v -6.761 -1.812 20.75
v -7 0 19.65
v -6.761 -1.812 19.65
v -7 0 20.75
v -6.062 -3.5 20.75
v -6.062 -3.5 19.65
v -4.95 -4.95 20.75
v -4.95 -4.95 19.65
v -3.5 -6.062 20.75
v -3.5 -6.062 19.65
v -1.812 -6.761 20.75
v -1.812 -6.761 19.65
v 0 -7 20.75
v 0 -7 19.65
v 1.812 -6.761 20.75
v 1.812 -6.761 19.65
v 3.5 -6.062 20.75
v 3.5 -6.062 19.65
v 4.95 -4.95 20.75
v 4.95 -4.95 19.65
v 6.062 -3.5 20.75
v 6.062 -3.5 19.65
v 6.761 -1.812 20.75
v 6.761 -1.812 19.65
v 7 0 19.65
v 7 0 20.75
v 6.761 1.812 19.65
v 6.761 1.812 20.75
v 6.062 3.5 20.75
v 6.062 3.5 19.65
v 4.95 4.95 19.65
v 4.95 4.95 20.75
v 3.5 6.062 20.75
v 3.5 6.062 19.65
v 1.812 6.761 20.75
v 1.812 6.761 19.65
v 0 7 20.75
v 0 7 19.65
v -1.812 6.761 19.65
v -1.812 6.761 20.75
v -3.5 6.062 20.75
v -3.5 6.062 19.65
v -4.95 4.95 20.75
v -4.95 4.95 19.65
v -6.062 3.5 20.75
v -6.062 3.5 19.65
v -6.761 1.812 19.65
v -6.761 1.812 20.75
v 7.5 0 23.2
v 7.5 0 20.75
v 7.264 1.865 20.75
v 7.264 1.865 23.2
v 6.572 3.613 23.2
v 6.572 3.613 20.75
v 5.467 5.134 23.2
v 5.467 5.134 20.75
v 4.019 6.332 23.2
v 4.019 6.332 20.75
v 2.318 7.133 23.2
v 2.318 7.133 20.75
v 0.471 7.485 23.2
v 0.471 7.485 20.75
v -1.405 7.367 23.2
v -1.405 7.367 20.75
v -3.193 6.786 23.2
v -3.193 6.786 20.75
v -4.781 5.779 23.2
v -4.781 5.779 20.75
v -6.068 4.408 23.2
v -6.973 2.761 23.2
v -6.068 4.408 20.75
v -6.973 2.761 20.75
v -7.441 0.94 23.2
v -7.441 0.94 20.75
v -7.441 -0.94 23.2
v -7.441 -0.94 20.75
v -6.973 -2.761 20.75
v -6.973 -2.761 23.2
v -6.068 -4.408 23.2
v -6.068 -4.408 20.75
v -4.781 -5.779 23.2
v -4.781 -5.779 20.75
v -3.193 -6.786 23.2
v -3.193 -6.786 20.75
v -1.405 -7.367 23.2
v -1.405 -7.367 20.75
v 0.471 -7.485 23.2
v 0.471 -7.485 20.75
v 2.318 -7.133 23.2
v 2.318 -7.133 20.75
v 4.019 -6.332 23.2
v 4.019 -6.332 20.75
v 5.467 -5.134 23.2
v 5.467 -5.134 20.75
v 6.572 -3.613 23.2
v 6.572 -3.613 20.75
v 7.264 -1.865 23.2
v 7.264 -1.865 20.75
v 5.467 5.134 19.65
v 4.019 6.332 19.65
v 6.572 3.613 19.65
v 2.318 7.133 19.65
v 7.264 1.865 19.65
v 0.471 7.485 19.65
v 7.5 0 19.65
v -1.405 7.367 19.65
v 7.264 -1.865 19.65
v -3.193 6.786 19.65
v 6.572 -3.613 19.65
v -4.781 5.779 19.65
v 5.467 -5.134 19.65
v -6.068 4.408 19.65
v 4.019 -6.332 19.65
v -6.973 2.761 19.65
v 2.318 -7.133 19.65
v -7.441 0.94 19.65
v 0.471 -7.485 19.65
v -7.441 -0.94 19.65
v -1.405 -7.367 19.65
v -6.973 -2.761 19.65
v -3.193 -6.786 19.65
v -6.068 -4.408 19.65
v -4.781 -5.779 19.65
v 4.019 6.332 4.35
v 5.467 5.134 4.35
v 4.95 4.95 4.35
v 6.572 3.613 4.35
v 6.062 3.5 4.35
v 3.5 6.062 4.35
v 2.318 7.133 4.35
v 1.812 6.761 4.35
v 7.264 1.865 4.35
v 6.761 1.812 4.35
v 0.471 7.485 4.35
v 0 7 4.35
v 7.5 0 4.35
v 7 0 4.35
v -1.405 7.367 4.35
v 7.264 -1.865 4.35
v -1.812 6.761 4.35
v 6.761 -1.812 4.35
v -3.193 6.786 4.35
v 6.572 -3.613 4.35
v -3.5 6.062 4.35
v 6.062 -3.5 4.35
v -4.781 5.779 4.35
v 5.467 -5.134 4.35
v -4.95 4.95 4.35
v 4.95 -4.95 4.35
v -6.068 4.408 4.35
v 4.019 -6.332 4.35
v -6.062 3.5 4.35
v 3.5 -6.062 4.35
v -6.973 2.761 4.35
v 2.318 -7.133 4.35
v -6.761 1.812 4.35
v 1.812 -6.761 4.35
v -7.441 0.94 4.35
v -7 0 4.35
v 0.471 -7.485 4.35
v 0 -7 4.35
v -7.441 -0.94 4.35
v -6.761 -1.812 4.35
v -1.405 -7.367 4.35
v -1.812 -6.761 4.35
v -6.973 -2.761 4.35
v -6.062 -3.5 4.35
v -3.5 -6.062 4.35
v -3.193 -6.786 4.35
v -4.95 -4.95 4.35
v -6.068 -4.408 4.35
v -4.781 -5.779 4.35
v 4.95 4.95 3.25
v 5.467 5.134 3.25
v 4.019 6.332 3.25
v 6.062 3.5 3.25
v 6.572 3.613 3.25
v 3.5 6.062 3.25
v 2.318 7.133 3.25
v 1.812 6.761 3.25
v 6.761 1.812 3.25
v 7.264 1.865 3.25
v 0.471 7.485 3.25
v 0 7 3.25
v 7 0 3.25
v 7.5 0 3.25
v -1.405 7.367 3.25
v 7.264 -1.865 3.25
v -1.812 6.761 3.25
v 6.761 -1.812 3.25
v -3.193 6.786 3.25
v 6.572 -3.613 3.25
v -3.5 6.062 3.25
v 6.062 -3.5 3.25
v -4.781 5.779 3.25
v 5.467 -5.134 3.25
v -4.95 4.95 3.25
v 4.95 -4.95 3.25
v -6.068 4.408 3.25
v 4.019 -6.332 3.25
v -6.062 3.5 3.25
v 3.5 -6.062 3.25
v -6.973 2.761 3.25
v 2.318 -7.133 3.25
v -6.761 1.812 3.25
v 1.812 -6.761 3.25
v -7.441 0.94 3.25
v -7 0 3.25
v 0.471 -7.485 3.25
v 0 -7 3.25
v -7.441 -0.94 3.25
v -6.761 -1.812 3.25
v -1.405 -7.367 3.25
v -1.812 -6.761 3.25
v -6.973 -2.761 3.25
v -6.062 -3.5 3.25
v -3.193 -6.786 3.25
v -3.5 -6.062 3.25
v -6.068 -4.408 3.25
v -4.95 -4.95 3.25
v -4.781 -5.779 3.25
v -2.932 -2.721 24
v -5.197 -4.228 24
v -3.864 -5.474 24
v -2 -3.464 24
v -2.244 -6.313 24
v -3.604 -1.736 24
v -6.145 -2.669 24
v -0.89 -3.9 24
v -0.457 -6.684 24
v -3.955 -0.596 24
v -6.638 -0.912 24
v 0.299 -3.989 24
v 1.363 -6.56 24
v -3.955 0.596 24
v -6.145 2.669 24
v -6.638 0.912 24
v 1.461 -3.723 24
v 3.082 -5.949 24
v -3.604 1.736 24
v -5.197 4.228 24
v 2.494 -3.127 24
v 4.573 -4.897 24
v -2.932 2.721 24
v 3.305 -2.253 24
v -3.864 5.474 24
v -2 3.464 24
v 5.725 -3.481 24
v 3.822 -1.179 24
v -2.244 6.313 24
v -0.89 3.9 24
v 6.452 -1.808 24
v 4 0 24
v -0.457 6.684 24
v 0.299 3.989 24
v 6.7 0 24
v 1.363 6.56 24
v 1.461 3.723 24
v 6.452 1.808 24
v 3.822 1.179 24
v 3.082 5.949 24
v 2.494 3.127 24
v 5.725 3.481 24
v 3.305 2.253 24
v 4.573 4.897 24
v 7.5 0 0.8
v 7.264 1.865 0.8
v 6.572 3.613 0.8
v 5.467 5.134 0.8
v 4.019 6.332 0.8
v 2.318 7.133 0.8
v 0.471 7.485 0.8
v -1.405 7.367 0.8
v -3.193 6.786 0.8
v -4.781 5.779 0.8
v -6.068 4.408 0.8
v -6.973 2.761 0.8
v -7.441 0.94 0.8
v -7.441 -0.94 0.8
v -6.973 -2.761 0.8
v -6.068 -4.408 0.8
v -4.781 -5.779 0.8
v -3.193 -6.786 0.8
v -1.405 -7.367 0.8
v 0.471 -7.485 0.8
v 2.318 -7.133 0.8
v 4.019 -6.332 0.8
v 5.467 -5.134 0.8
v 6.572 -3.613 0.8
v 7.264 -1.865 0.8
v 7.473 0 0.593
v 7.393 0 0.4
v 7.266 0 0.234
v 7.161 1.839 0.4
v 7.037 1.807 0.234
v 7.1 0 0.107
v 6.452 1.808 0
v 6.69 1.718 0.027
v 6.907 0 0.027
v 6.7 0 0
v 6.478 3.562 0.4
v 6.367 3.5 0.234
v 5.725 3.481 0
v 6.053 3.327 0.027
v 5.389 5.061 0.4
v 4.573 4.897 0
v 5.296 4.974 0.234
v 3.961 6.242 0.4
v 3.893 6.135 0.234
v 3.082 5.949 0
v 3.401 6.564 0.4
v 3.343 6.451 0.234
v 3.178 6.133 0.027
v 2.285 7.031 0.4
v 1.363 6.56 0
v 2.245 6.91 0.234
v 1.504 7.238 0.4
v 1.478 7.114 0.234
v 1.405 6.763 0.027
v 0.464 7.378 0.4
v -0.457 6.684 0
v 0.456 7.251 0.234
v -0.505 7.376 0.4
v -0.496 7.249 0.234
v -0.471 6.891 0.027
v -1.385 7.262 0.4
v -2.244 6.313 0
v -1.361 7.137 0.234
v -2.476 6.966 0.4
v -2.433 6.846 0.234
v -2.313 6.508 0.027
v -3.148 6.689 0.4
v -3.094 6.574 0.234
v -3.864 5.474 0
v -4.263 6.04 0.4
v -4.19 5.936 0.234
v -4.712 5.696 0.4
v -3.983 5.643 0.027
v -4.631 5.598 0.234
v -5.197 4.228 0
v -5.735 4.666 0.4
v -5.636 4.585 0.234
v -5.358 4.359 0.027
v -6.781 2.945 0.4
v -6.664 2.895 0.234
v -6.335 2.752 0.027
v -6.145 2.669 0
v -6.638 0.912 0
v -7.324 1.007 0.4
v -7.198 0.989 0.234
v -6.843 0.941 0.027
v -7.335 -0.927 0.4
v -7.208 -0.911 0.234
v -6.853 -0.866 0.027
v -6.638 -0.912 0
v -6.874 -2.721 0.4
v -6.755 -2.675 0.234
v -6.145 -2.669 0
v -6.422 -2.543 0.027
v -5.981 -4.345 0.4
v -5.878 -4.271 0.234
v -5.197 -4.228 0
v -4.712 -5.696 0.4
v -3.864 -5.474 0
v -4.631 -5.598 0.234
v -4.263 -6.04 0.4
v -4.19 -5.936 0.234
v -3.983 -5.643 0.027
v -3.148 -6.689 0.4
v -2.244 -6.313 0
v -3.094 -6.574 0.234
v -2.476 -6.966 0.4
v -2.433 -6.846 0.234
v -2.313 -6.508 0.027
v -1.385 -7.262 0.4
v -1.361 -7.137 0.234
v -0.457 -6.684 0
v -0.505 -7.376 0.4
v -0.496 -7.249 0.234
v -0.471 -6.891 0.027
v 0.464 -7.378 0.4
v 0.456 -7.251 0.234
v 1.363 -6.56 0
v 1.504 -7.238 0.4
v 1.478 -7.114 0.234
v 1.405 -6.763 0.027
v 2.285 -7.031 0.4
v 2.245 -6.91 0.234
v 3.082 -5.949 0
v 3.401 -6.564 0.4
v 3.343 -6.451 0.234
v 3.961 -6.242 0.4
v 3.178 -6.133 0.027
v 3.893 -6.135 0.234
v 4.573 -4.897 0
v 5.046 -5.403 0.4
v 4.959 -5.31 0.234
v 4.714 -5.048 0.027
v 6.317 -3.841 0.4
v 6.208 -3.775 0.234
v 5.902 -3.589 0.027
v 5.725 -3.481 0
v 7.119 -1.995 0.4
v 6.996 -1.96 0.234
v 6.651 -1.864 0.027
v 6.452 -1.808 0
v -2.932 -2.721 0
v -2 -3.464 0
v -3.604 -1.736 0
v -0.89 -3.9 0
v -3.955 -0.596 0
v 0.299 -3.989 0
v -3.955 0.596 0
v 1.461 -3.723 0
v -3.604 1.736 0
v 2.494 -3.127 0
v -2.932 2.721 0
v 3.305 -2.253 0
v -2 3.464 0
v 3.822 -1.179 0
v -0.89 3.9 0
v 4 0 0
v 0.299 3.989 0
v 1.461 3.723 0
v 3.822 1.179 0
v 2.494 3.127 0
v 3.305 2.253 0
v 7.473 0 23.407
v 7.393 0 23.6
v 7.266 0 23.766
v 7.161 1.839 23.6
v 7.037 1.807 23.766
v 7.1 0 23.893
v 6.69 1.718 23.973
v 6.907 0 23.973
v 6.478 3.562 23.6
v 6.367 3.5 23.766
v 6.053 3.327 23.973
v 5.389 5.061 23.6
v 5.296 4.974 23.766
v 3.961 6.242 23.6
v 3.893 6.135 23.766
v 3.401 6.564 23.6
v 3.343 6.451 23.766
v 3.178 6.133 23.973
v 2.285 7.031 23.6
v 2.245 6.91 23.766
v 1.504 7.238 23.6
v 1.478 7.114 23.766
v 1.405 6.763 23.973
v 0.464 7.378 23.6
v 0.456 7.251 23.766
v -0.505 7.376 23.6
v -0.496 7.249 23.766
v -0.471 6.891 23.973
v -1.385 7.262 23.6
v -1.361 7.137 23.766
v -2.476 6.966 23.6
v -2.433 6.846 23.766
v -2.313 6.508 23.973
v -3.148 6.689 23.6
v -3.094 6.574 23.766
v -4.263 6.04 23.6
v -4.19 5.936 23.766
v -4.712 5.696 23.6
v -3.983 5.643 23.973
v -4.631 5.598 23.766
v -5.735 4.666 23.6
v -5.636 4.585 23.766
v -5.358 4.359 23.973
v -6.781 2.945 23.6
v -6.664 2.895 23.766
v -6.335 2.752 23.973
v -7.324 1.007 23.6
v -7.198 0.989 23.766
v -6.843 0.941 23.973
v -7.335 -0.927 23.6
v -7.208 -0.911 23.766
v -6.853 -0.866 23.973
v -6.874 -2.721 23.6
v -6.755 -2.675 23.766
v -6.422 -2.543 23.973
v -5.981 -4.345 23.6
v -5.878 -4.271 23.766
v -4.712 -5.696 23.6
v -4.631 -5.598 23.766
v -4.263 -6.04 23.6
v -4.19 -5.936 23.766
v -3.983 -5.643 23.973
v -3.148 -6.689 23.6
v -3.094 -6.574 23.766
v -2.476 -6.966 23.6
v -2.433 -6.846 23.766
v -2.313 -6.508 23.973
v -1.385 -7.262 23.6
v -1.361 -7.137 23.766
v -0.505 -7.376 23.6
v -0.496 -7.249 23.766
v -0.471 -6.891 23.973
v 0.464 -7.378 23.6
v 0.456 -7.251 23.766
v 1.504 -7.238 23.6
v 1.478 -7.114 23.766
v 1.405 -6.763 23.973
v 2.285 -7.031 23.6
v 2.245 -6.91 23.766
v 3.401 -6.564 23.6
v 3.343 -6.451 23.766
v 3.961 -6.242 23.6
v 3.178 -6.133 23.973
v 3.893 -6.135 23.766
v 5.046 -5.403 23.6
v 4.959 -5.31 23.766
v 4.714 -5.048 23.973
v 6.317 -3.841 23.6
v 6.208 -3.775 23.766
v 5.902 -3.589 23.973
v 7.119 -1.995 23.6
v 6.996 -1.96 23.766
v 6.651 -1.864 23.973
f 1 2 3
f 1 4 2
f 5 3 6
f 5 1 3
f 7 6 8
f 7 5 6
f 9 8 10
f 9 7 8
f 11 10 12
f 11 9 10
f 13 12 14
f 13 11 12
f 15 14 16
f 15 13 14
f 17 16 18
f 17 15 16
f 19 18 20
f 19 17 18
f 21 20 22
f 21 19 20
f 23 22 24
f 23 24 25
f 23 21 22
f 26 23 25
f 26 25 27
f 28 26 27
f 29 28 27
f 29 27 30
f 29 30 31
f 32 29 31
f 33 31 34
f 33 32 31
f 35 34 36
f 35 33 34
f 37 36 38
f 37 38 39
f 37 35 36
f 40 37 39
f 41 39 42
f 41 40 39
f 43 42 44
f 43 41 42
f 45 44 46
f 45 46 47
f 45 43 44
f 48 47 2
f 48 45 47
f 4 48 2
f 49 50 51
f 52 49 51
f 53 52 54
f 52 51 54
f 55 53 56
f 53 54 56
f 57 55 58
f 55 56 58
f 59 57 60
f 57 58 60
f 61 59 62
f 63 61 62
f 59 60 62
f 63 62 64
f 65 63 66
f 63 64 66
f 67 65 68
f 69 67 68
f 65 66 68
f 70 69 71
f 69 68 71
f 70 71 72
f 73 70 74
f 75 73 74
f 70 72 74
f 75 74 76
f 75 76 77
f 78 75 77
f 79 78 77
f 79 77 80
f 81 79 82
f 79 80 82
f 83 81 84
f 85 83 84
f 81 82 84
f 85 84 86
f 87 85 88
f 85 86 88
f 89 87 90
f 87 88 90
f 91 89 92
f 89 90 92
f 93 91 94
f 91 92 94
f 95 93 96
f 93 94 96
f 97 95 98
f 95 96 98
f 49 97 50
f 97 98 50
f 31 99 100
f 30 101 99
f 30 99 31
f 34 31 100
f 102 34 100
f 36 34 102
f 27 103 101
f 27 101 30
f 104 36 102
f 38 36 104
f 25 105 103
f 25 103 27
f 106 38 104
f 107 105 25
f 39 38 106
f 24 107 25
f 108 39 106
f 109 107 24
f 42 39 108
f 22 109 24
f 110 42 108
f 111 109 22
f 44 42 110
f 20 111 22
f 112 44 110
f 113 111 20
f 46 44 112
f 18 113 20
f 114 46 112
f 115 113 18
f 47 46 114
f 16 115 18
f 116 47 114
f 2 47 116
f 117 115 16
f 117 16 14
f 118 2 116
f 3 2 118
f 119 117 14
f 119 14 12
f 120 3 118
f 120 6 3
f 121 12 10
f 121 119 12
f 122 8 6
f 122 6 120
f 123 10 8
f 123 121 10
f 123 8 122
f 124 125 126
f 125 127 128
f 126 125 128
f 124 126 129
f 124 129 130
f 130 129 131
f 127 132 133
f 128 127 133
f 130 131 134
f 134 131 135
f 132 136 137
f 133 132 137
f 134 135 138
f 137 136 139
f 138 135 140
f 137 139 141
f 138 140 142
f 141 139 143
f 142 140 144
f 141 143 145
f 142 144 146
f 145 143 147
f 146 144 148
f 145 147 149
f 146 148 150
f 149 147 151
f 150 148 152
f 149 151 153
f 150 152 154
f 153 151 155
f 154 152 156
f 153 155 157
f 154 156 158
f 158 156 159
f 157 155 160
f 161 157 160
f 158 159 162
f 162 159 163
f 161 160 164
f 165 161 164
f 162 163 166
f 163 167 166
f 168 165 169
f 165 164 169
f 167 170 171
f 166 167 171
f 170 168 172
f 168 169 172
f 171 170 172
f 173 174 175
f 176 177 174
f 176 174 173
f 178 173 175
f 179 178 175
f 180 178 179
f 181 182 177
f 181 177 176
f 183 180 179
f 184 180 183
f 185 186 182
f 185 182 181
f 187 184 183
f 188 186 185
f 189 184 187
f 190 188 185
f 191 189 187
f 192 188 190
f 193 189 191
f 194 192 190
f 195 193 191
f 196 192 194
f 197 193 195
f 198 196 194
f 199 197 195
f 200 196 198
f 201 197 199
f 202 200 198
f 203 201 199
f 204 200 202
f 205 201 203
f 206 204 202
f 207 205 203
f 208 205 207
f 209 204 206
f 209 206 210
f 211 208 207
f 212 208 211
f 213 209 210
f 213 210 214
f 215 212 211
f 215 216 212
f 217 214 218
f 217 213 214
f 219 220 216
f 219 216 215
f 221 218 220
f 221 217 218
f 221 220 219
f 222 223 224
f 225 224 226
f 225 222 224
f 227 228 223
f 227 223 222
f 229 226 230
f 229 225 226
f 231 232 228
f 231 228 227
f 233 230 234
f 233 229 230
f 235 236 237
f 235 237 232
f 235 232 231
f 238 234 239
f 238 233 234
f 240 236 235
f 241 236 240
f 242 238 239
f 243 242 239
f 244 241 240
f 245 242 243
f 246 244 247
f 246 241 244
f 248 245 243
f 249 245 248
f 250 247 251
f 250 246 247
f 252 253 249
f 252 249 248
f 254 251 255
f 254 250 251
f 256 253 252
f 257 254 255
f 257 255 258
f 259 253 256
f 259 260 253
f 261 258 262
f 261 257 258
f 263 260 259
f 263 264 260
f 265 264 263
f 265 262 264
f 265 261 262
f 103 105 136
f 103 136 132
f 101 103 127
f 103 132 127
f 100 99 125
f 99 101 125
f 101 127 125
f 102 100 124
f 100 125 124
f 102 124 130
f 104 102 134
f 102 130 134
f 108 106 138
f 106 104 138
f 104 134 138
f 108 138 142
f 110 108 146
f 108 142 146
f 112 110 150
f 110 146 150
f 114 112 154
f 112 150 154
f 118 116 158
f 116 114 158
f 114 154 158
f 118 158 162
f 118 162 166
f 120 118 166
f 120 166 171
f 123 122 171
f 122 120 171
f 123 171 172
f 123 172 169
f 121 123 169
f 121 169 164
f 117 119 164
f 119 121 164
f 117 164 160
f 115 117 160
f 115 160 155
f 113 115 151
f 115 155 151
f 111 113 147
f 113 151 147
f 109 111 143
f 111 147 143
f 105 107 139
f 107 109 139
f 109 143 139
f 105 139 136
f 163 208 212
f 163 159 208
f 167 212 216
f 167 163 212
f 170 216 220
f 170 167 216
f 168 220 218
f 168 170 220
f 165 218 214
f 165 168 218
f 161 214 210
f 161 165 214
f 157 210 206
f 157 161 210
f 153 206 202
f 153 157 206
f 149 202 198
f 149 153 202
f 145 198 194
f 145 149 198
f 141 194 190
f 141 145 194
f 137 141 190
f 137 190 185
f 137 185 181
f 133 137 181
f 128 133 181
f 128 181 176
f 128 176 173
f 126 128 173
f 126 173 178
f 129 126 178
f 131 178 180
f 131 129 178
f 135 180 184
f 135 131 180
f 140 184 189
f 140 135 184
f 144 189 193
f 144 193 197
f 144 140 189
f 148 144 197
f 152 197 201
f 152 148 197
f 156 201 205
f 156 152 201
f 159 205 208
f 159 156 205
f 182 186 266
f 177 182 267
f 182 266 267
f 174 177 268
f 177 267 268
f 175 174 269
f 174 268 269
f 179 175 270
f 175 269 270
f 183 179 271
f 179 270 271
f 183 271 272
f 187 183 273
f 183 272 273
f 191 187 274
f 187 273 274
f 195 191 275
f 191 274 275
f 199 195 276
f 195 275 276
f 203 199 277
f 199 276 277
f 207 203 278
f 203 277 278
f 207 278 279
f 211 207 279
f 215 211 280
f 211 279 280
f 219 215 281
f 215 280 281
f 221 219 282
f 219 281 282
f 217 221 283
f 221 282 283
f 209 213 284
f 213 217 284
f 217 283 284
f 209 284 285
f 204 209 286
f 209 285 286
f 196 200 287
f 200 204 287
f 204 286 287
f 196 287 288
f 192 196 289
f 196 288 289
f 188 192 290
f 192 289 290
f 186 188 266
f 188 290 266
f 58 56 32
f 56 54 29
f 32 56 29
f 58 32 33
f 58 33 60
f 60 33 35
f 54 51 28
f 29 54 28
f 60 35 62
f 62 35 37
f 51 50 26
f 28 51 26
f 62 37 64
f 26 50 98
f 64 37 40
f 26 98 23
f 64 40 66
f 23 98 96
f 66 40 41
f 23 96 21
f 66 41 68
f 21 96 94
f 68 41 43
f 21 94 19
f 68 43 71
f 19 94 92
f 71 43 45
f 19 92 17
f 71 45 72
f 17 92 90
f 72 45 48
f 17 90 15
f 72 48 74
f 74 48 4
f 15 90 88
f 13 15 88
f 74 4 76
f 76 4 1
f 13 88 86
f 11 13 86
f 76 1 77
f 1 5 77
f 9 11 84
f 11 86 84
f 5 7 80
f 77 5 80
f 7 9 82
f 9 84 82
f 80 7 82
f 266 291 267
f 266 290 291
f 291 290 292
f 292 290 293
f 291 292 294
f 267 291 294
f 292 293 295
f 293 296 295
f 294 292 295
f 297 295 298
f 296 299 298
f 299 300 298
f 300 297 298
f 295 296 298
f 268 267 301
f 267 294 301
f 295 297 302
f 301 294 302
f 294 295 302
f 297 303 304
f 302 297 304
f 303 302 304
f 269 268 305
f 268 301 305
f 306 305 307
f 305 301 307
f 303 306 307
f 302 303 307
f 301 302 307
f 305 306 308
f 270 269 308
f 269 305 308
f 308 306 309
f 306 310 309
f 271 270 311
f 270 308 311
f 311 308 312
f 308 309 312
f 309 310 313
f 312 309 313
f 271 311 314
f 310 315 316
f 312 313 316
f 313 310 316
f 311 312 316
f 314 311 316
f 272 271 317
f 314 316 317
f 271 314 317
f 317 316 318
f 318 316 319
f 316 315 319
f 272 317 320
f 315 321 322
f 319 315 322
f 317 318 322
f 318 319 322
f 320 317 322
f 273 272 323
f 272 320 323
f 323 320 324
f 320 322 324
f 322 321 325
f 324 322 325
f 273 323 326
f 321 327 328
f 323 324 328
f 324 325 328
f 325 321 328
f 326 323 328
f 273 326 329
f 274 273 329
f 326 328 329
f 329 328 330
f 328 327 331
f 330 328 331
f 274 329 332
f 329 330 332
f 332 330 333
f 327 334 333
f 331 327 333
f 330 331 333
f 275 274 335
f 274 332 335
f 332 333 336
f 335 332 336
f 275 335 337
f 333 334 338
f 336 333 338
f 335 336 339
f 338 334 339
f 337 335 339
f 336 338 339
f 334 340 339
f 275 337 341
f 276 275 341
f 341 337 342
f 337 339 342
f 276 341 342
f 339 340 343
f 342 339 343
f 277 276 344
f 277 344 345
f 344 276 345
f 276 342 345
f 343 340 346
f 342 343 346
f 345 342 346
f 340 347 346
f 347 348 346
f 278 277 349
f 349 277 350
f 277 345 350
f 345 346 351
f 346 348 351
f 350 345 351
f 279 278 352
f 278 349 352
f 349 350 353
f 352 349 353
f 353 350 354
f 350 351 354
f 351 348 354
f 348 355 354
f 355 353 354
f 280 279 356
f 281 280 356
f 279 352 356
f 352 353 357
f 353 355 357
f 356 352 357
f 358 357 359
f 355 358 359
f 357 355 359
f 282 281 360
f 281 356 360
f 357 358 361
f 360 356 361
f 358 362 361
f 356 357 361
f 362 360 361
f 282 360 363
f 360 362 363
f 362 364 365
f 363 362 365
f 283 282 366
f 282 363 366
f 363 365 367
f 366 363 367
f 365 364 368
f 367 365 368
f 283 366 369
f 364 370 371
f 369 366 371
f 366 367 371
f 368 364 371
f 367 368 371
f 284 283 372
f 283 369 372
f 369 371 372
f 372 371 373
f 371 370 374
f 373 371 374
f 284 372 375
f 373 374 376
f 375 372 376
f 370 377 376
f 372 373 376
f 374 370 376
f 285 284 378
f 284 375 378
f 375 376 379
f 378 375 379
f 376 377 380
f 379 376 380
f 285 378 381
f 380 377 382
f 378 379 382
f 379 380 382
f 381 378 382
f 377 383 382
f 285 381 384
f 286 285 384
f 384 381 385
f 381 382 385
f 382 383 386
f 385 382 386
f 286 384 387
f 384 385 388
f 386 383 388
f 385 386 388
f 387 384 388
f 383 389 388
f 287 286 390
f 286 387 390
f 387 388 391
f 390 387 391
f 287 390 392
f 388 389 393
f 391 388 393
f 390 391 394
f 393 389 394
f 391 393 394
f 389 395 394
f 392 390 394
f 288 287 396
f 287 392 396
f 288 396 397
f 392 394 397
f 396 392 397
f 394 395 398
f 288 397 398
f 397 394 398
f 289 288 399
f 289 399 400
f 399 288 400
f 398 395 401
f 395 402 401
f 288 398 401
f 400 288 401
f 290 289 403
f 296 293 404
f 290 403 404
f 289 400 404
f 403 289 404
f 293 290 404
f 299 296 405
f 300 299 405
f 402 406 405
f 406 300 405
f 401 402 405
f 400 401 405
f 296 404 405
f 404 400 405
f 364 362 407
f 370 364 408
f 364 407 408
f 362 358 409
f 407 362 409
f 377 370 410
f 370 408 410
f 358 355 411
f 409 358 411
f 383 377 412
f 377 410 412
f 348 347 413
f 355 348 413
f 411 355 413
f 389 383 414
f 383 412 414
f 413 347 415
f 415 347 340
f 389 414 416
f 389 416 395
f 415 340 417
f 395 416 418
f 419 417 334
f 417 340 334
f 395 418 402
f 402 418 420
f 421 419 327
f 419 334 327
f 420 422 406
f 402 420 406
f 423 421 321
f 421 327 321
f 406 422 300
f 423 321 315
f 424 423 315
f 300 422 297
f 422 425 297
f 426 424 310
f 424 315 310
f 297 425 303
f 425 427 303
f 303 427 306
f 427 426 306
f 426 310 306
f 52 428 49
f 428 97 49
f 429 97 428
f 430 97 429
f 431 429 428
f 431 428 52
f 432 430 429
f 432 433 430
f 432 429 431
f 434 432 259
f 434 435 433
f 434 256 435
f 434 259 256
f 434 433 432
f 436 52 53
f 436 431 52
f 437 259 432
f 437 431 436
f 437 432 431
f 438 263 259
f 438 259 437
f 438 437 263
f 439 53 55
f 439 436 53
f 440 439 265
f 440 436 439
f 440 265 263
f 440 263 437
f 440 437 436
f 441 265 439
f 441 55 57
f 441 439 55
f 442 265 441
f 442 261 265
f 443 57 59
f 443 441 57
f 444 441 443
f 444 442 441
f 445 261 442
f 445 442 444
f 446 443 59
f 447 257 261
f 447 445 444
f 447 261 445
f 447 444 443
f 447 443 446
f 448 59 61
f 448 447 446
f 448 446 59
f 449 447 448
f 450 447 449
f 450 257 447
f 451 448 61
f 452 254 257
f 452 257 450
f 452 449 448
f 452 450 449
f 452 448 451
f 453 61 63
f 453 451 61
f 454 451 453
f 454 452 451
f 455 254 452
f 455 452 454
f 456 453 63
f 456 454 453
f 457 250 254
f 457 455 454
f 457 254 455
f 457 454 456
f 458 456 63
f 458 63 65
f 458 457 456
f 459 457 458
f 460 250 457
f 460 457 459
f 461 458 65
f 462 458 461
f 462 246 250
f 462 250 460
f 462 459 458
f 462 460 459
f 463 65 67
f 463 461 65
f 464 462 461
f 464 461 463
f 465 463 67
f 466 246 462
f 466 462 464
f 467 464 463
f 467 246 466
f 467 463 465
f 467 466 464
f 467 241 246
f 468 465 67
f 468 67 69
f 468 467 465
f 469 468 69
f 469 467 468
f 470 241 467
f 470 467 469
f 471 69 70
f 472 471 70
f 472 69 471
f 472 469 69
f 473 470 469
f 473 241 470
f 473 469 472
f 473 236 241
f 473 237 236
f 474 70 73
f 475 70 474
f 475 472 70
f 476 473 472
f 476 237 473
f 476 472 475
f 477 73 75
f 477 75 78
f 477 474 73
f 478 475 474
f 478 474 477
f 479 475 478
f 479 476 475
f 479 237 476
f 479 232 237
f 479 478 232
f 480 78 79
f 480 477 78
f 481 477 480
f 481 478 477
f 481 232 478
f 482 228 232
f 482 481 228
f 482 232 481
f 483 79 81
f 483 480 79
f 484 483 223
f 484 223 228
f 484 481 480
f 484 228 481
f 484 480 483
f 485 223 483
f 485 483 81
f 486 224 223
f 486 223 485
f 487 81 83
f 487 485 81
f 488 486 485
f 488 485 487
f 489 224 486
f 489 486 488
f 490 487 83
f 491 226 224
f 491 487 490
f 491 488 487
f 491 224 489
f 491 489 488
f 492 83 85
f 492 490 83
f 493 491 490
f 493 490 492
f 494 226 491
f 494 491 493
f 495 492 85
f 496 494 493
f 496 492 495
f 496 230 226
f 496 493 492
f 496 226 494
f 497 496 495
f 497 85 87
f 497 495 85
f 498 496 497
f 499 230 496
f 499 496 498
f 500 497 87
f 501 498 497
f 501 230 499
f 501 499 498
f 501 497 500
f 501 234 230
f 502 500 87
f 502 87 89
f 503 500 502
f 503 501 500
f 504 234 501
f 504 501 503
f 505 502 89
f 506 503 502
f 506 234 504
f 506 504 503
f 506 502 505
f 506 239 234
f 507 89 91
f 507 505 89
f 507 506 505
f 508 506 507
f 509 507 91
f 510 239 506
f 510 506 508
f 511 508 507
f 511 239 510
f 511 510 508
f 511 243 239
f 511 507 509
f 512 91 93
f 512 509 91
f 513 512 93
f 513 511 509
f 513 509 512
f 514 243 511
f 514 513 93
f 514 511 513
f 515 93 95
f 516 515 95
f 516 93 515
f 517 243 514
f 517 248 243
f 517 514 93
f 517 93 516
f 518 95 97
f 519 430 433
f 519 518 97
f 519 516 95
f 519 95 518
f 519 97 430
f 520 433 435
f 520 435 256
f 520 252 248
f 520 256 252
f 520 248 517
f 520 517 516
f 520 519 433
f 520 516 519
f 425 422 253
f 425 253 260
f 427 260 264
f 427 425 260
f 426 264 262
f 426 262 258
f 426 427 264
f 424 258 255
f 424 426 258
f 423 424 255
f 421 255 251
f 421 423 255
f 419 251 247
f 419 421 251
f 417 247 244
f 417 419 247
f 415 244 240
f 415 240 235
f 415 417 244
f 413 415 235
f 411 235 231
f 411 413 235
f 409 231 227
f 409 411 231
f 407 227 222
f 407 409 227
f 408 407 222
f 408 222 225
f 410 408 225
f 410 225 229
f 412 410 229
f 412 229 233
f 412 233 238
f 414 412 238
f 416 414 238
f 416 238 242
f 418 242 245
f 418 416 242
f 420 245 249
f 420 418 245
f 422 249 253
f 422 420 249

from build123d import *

# Parameters (mm, degrees)
F0_R     = 7.5
F0_R_2   = 4
F1_DEPTH = 24
F2_W     = 0.5
F2_H     = 1.1
F4_R     = 0.8


with BuildPart() as f1:
    # F0 (on Top) → F1 (new body)
    with BuildSketch(Plane.XY):
        Circle(F0_R)
        Circle(F0_R_2, mode=Mode.SUBTRACT)
    extrude(amount=F1_DEPTH)

    # F2 (on Front) → F3 (revolve, cut)
    with BuildSketch(Plane.XZ):
        with Locations((-7.25, 20.2)):
            Rectangle(F2_W, F2_H)
        with Locations((-7.25, 3.8)):
            Rectangle(F2_W, F2_H)
    revolve(axis=Axis((0, 0, 12), (0, 0, 1)), mode=Mode.SUBTRACT)

    # F4
    f4_edges = [f1.edges().sort_by_distance(p)[0] for p in [
        (-7.5, 0, 24),
        (-7.5, 0, 0),
    ]]
    fillet(f4_edges, radius=F4_R)


solid = f1.part
